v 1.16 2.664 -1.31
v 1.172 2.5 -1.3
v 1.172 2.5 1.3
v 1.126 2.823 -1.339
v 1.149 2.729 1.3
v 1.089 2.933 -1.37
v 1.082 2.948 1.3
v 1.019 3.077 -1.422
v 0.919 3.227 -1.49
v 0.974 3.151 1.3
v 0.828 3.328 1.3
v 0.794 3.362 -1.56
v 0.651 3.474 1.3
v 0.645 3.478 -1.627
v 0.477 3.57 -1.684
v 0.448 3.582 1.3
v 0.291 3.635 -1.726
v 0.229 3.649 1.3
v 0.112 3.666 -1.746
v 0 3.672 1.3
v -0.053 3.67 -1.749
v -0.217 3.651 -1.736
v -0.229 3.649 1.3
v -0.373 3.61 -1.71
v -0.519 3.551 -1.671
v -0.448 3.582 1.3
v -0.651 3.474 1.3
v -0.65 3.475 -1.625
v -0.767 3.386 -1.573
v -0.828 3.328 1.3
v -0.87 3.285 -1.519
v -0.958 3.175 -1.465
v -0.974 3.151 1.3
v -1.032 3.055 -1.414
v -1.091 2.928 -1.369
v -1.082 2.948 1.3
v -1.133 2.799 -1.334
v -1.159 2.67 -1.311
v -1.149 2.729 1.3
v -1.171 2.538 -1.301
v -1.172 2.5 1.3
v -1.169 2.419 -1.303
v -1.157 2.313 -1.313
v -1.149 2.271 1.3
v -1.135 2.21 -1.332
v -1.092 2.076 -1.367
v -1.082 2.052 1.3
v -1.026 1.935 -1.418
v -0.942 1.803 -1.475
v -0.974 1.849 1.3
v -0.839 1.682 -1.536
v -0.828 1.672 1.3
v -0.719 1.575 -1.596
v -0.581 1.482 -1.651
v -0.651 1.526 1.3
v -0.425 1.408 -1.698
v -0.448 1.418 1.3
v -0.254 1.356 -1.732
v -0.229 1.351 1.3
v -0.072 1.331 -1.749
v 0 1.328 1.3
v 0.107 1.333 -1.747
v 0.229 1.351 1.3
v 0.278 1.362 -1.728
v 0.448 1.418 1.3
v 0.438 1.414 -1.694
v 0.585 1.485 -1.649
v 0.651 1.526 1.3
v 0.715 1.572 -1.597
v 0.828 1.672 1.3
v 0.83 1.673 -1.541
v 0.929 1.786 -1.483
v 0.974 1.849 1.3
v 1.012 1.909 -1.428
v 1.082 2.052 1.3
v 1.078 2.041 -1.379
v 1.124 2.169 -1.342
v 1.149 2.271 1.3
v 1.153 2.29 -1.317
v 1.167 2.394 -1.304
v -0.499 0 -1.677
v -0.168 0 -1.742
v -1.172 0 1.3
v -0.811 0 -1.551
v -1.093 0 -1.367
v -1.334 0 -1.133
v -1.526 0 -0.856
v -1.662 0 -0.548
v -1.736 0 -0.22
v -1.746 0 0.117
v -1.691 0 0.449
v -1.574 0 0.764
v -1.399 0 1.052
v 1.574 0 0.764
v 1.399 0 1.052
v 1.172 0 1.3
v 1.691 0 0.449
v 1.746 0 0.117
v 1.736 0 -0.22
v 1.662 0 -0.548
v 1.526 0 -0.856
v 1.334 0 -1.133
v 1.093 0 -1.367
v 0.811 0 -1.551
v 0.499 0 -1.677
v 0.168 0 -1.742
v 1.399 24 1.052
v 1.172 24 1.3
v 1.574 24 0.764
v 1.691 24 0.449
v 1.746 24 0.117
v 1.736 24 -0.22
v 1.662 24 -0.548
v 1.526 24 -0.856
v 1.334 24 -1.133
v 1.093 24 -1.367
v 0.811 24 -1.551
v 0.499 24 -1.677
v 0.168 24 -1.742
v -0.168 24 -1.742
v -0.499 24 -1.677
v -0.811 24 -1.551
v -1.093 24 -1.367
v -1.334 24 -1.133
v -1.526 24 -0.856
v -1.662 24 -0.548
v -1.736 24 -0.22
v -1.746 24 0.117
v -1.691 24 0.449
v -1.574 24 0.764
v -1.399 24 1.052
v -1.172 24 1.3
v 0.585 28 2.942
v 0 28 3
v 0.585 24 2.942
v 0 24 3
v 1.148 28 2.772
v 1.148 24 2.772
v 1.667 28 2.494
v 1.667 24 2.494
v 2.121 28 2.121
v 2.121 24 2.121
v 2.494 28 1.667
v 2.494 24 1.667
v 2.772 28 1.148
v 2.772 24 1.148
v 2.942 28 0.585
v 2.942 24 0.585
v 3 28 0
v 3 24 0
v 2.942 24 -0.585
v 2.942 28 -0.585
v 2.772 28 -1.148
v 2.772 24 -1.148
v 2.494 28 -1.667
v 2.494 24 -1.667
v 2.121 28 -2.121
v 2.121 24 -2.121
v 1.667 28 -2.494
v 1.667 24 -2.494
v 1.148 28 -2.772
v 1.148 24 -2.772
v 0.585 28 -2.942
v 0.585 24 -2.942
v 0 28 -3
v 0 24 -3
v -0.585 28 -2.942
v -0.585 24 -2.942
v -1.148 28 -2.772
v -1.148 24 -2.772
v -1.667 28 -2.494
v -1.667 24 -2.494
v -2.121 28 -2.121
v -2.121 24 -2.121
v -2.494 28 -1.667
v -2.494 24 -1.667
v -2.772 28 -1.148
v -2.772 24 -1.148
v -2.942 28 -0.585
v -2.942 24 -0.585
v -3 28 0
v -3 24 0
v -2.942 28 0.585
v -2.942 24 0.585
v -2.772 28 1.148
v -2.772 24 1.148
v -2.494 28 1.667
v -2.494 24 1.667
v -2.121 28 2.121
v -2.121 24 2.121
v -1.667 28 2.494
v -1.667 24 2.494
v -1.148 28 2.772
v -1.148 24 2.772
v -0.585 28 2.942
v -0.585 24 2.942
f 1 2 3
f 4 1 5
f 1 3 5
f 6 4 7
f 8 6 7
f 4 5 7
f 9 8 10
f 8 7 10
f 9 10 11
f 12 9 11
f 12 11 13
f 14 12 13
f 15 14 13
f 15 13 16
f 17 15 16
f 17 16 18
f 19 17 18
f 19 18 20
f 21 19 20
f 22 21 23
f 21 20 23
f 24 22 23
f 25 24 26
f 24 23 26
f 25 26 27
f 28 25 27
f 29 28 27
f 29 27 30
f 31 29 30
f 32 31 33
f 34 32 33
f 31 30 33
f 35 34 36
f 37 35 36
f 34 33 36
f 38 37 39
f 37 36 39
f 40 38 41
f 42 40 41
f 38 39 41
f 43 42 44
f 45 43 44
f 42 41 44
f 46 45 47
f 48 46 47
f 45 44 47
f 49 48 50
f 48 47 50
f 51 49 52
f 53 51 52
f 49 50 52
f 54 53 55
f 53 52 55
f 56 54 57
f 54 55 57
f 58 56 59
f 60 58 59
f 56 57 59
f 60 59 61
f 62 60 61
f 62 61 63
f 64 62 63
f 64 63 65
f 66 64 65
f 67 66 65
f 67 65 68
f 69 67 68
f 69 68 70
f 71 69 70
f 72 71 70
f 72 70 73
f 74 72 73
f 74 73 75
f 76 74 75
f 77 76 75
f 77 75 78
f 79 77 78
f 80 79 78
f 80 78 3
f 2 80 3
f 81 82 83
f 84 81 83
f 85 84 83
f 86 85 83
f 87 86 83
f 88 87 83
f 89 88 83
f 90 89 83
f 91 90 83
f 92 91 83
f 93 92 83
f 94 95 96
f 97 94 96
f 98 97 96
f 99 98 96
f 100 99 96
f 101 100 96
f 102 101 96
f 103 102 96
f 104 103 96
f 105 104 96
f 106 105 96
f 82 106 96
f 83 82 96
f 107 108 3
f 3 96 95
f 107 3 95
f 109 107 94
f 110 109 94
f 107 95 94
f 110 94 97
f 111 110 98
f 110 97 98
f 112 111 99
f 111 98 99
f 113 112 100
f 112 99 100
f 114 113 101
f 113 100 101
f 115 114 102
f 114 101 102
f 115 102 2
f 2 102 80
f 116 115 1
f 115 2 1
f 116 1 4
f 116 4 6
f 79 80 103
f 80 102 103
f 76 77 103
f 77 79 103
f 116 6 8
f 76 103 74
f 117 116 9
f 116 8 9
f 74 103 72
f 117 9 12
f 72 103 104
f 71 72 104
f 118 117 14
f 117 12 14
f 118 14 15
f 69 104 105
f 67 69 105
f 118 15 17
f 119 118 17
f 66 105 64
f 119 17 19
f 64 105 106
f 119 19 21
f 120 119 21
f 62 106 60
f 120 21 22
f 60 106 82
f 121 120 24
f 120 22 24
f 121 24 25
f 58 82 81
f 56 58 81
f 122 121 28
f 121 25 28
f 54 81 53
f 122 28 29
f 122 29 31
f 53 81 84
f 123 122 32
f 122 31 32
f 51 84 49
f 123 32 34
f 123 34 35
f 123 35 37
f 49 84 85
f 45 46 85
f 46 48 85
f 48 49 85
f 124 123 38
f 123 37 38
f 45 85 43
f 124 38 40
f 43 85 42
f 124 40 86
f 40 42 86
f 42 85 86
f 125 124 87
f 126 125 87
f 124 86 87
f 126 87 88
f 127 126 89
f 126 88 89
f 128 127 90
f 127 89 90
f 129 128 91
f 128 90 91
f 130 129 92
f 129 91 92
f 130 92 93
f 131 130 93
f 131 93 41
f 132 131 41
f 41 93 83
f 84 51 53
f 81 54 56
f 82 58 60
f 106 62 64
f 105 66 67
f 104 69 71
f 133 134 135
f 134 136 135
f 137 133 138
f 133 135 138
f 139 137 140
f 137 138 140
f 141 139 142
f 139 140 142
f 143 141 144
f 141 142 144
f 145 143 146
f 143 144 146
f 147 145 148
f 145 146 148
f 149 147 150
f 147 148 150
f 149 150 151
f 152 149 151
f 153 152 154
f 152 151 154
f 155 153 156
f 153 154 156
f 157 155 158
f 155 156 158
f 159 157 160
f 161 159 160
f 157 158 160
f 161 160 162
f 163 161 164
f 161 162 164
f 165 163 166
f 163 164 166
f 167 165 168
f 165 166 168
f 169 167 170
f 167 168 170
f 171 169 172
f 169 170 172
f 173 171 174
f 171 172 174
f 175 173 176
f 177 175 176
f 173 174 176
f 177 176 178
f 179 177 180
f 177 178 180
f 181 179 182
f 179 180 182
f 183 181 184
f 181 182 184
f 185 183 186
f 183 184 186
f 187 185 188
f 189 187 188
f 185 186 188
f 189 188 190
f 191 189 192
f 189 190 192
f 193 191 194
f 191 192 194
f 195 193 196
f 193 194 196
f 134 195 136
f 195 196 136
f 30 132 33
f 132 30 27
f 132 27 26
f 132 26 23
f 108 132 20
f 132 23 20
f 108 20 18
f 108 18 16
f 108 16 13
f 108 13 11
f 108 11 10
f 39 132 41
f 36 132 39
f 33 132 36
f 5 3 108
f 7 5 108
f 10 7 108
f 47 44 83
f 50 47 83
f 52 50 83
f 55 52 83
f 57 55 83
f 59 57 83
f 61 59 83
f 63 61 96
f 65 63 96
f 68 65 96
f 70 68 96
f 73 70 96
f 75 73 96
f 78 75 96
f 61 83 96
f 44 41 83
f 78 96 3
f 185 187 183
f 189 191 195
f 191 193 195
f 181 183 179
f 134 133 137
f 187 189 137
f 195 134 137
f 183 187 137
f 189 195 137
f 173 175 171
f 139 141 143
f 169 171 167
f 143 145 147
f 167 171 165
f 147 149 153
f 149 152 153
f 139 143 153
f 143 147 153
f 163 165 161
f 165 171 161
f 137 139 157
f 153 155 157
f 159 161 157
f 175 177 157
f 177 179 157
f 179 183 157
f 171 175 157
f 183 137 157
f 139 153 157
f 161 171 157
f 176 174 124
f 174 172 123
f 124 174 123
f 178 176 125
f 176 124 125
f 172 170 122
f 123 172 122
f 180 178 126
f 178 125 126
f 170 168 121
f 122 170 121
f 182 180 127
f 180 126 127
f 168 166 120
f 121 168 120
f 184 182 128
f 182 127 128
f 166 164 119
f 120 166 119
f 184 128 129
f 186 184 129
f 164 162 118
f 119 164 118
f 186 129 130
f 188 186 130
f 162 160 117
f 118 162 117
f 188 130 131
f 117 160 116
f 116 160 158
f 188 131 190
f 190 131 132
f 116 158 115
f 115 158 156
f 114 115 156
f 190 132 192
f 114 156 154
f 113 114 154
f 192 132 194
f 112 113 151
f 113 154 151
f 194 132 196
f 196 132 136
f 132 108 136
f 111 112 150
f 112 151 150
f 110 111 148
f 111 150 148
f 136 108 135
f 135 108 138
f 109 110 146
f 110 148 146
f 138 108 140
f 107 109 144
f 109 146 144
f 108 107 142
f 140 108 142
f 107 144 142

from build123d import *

# Parameters (mm, degrees)
CUT_EXTRUDE1_DEPTH = 24
SKETCH4_R          = 1.171537451
CUT_EXTRUDE2_DEPTH = 5.3


with BuildPart() as part:
    # Sketch2 → Revolve1 (revolve)
    with BuildSketch(Plane(origin=(0, 0, 0), x_dir=(0, 0, -1), z_dir=(1, 0, 0))):
        Polygon((0, 0), (0, 28), (-3, 28), (-3, 24), (-1.75, 24), (-1.75, 0), align=None)
    revolve(axis=Axis((0, 0, 0), (0, 1, 0)))

    # Sketch3 → Cut-Extrude1 (cut)
    with BuildSketch(Plane.XZ):
        with BuildLine():
            Line((-1.171537451, 1.3), (1.171537451, 1.3))
            ThreePointArc((1.171537451, 1.3), (0, 1.75), (-1.171537451, 1.3))
        make_face()
    extrude(amount=-CUT_EXTRUDE1_DEPTH, mode=Mode.SUBTRACT)

    # Sketch4 → Cut-Extrude2 (cut, through all)
    with BuildSketch(Plane.XY.offset(1.3)):
        with Locations((0, 2.5)):
            Circle(SKETCH4_R)
    extrude(amount=-CUT_EXTRUDE2_DEPTH, mode=Mode.SUBTRACT)


solid = part.part
